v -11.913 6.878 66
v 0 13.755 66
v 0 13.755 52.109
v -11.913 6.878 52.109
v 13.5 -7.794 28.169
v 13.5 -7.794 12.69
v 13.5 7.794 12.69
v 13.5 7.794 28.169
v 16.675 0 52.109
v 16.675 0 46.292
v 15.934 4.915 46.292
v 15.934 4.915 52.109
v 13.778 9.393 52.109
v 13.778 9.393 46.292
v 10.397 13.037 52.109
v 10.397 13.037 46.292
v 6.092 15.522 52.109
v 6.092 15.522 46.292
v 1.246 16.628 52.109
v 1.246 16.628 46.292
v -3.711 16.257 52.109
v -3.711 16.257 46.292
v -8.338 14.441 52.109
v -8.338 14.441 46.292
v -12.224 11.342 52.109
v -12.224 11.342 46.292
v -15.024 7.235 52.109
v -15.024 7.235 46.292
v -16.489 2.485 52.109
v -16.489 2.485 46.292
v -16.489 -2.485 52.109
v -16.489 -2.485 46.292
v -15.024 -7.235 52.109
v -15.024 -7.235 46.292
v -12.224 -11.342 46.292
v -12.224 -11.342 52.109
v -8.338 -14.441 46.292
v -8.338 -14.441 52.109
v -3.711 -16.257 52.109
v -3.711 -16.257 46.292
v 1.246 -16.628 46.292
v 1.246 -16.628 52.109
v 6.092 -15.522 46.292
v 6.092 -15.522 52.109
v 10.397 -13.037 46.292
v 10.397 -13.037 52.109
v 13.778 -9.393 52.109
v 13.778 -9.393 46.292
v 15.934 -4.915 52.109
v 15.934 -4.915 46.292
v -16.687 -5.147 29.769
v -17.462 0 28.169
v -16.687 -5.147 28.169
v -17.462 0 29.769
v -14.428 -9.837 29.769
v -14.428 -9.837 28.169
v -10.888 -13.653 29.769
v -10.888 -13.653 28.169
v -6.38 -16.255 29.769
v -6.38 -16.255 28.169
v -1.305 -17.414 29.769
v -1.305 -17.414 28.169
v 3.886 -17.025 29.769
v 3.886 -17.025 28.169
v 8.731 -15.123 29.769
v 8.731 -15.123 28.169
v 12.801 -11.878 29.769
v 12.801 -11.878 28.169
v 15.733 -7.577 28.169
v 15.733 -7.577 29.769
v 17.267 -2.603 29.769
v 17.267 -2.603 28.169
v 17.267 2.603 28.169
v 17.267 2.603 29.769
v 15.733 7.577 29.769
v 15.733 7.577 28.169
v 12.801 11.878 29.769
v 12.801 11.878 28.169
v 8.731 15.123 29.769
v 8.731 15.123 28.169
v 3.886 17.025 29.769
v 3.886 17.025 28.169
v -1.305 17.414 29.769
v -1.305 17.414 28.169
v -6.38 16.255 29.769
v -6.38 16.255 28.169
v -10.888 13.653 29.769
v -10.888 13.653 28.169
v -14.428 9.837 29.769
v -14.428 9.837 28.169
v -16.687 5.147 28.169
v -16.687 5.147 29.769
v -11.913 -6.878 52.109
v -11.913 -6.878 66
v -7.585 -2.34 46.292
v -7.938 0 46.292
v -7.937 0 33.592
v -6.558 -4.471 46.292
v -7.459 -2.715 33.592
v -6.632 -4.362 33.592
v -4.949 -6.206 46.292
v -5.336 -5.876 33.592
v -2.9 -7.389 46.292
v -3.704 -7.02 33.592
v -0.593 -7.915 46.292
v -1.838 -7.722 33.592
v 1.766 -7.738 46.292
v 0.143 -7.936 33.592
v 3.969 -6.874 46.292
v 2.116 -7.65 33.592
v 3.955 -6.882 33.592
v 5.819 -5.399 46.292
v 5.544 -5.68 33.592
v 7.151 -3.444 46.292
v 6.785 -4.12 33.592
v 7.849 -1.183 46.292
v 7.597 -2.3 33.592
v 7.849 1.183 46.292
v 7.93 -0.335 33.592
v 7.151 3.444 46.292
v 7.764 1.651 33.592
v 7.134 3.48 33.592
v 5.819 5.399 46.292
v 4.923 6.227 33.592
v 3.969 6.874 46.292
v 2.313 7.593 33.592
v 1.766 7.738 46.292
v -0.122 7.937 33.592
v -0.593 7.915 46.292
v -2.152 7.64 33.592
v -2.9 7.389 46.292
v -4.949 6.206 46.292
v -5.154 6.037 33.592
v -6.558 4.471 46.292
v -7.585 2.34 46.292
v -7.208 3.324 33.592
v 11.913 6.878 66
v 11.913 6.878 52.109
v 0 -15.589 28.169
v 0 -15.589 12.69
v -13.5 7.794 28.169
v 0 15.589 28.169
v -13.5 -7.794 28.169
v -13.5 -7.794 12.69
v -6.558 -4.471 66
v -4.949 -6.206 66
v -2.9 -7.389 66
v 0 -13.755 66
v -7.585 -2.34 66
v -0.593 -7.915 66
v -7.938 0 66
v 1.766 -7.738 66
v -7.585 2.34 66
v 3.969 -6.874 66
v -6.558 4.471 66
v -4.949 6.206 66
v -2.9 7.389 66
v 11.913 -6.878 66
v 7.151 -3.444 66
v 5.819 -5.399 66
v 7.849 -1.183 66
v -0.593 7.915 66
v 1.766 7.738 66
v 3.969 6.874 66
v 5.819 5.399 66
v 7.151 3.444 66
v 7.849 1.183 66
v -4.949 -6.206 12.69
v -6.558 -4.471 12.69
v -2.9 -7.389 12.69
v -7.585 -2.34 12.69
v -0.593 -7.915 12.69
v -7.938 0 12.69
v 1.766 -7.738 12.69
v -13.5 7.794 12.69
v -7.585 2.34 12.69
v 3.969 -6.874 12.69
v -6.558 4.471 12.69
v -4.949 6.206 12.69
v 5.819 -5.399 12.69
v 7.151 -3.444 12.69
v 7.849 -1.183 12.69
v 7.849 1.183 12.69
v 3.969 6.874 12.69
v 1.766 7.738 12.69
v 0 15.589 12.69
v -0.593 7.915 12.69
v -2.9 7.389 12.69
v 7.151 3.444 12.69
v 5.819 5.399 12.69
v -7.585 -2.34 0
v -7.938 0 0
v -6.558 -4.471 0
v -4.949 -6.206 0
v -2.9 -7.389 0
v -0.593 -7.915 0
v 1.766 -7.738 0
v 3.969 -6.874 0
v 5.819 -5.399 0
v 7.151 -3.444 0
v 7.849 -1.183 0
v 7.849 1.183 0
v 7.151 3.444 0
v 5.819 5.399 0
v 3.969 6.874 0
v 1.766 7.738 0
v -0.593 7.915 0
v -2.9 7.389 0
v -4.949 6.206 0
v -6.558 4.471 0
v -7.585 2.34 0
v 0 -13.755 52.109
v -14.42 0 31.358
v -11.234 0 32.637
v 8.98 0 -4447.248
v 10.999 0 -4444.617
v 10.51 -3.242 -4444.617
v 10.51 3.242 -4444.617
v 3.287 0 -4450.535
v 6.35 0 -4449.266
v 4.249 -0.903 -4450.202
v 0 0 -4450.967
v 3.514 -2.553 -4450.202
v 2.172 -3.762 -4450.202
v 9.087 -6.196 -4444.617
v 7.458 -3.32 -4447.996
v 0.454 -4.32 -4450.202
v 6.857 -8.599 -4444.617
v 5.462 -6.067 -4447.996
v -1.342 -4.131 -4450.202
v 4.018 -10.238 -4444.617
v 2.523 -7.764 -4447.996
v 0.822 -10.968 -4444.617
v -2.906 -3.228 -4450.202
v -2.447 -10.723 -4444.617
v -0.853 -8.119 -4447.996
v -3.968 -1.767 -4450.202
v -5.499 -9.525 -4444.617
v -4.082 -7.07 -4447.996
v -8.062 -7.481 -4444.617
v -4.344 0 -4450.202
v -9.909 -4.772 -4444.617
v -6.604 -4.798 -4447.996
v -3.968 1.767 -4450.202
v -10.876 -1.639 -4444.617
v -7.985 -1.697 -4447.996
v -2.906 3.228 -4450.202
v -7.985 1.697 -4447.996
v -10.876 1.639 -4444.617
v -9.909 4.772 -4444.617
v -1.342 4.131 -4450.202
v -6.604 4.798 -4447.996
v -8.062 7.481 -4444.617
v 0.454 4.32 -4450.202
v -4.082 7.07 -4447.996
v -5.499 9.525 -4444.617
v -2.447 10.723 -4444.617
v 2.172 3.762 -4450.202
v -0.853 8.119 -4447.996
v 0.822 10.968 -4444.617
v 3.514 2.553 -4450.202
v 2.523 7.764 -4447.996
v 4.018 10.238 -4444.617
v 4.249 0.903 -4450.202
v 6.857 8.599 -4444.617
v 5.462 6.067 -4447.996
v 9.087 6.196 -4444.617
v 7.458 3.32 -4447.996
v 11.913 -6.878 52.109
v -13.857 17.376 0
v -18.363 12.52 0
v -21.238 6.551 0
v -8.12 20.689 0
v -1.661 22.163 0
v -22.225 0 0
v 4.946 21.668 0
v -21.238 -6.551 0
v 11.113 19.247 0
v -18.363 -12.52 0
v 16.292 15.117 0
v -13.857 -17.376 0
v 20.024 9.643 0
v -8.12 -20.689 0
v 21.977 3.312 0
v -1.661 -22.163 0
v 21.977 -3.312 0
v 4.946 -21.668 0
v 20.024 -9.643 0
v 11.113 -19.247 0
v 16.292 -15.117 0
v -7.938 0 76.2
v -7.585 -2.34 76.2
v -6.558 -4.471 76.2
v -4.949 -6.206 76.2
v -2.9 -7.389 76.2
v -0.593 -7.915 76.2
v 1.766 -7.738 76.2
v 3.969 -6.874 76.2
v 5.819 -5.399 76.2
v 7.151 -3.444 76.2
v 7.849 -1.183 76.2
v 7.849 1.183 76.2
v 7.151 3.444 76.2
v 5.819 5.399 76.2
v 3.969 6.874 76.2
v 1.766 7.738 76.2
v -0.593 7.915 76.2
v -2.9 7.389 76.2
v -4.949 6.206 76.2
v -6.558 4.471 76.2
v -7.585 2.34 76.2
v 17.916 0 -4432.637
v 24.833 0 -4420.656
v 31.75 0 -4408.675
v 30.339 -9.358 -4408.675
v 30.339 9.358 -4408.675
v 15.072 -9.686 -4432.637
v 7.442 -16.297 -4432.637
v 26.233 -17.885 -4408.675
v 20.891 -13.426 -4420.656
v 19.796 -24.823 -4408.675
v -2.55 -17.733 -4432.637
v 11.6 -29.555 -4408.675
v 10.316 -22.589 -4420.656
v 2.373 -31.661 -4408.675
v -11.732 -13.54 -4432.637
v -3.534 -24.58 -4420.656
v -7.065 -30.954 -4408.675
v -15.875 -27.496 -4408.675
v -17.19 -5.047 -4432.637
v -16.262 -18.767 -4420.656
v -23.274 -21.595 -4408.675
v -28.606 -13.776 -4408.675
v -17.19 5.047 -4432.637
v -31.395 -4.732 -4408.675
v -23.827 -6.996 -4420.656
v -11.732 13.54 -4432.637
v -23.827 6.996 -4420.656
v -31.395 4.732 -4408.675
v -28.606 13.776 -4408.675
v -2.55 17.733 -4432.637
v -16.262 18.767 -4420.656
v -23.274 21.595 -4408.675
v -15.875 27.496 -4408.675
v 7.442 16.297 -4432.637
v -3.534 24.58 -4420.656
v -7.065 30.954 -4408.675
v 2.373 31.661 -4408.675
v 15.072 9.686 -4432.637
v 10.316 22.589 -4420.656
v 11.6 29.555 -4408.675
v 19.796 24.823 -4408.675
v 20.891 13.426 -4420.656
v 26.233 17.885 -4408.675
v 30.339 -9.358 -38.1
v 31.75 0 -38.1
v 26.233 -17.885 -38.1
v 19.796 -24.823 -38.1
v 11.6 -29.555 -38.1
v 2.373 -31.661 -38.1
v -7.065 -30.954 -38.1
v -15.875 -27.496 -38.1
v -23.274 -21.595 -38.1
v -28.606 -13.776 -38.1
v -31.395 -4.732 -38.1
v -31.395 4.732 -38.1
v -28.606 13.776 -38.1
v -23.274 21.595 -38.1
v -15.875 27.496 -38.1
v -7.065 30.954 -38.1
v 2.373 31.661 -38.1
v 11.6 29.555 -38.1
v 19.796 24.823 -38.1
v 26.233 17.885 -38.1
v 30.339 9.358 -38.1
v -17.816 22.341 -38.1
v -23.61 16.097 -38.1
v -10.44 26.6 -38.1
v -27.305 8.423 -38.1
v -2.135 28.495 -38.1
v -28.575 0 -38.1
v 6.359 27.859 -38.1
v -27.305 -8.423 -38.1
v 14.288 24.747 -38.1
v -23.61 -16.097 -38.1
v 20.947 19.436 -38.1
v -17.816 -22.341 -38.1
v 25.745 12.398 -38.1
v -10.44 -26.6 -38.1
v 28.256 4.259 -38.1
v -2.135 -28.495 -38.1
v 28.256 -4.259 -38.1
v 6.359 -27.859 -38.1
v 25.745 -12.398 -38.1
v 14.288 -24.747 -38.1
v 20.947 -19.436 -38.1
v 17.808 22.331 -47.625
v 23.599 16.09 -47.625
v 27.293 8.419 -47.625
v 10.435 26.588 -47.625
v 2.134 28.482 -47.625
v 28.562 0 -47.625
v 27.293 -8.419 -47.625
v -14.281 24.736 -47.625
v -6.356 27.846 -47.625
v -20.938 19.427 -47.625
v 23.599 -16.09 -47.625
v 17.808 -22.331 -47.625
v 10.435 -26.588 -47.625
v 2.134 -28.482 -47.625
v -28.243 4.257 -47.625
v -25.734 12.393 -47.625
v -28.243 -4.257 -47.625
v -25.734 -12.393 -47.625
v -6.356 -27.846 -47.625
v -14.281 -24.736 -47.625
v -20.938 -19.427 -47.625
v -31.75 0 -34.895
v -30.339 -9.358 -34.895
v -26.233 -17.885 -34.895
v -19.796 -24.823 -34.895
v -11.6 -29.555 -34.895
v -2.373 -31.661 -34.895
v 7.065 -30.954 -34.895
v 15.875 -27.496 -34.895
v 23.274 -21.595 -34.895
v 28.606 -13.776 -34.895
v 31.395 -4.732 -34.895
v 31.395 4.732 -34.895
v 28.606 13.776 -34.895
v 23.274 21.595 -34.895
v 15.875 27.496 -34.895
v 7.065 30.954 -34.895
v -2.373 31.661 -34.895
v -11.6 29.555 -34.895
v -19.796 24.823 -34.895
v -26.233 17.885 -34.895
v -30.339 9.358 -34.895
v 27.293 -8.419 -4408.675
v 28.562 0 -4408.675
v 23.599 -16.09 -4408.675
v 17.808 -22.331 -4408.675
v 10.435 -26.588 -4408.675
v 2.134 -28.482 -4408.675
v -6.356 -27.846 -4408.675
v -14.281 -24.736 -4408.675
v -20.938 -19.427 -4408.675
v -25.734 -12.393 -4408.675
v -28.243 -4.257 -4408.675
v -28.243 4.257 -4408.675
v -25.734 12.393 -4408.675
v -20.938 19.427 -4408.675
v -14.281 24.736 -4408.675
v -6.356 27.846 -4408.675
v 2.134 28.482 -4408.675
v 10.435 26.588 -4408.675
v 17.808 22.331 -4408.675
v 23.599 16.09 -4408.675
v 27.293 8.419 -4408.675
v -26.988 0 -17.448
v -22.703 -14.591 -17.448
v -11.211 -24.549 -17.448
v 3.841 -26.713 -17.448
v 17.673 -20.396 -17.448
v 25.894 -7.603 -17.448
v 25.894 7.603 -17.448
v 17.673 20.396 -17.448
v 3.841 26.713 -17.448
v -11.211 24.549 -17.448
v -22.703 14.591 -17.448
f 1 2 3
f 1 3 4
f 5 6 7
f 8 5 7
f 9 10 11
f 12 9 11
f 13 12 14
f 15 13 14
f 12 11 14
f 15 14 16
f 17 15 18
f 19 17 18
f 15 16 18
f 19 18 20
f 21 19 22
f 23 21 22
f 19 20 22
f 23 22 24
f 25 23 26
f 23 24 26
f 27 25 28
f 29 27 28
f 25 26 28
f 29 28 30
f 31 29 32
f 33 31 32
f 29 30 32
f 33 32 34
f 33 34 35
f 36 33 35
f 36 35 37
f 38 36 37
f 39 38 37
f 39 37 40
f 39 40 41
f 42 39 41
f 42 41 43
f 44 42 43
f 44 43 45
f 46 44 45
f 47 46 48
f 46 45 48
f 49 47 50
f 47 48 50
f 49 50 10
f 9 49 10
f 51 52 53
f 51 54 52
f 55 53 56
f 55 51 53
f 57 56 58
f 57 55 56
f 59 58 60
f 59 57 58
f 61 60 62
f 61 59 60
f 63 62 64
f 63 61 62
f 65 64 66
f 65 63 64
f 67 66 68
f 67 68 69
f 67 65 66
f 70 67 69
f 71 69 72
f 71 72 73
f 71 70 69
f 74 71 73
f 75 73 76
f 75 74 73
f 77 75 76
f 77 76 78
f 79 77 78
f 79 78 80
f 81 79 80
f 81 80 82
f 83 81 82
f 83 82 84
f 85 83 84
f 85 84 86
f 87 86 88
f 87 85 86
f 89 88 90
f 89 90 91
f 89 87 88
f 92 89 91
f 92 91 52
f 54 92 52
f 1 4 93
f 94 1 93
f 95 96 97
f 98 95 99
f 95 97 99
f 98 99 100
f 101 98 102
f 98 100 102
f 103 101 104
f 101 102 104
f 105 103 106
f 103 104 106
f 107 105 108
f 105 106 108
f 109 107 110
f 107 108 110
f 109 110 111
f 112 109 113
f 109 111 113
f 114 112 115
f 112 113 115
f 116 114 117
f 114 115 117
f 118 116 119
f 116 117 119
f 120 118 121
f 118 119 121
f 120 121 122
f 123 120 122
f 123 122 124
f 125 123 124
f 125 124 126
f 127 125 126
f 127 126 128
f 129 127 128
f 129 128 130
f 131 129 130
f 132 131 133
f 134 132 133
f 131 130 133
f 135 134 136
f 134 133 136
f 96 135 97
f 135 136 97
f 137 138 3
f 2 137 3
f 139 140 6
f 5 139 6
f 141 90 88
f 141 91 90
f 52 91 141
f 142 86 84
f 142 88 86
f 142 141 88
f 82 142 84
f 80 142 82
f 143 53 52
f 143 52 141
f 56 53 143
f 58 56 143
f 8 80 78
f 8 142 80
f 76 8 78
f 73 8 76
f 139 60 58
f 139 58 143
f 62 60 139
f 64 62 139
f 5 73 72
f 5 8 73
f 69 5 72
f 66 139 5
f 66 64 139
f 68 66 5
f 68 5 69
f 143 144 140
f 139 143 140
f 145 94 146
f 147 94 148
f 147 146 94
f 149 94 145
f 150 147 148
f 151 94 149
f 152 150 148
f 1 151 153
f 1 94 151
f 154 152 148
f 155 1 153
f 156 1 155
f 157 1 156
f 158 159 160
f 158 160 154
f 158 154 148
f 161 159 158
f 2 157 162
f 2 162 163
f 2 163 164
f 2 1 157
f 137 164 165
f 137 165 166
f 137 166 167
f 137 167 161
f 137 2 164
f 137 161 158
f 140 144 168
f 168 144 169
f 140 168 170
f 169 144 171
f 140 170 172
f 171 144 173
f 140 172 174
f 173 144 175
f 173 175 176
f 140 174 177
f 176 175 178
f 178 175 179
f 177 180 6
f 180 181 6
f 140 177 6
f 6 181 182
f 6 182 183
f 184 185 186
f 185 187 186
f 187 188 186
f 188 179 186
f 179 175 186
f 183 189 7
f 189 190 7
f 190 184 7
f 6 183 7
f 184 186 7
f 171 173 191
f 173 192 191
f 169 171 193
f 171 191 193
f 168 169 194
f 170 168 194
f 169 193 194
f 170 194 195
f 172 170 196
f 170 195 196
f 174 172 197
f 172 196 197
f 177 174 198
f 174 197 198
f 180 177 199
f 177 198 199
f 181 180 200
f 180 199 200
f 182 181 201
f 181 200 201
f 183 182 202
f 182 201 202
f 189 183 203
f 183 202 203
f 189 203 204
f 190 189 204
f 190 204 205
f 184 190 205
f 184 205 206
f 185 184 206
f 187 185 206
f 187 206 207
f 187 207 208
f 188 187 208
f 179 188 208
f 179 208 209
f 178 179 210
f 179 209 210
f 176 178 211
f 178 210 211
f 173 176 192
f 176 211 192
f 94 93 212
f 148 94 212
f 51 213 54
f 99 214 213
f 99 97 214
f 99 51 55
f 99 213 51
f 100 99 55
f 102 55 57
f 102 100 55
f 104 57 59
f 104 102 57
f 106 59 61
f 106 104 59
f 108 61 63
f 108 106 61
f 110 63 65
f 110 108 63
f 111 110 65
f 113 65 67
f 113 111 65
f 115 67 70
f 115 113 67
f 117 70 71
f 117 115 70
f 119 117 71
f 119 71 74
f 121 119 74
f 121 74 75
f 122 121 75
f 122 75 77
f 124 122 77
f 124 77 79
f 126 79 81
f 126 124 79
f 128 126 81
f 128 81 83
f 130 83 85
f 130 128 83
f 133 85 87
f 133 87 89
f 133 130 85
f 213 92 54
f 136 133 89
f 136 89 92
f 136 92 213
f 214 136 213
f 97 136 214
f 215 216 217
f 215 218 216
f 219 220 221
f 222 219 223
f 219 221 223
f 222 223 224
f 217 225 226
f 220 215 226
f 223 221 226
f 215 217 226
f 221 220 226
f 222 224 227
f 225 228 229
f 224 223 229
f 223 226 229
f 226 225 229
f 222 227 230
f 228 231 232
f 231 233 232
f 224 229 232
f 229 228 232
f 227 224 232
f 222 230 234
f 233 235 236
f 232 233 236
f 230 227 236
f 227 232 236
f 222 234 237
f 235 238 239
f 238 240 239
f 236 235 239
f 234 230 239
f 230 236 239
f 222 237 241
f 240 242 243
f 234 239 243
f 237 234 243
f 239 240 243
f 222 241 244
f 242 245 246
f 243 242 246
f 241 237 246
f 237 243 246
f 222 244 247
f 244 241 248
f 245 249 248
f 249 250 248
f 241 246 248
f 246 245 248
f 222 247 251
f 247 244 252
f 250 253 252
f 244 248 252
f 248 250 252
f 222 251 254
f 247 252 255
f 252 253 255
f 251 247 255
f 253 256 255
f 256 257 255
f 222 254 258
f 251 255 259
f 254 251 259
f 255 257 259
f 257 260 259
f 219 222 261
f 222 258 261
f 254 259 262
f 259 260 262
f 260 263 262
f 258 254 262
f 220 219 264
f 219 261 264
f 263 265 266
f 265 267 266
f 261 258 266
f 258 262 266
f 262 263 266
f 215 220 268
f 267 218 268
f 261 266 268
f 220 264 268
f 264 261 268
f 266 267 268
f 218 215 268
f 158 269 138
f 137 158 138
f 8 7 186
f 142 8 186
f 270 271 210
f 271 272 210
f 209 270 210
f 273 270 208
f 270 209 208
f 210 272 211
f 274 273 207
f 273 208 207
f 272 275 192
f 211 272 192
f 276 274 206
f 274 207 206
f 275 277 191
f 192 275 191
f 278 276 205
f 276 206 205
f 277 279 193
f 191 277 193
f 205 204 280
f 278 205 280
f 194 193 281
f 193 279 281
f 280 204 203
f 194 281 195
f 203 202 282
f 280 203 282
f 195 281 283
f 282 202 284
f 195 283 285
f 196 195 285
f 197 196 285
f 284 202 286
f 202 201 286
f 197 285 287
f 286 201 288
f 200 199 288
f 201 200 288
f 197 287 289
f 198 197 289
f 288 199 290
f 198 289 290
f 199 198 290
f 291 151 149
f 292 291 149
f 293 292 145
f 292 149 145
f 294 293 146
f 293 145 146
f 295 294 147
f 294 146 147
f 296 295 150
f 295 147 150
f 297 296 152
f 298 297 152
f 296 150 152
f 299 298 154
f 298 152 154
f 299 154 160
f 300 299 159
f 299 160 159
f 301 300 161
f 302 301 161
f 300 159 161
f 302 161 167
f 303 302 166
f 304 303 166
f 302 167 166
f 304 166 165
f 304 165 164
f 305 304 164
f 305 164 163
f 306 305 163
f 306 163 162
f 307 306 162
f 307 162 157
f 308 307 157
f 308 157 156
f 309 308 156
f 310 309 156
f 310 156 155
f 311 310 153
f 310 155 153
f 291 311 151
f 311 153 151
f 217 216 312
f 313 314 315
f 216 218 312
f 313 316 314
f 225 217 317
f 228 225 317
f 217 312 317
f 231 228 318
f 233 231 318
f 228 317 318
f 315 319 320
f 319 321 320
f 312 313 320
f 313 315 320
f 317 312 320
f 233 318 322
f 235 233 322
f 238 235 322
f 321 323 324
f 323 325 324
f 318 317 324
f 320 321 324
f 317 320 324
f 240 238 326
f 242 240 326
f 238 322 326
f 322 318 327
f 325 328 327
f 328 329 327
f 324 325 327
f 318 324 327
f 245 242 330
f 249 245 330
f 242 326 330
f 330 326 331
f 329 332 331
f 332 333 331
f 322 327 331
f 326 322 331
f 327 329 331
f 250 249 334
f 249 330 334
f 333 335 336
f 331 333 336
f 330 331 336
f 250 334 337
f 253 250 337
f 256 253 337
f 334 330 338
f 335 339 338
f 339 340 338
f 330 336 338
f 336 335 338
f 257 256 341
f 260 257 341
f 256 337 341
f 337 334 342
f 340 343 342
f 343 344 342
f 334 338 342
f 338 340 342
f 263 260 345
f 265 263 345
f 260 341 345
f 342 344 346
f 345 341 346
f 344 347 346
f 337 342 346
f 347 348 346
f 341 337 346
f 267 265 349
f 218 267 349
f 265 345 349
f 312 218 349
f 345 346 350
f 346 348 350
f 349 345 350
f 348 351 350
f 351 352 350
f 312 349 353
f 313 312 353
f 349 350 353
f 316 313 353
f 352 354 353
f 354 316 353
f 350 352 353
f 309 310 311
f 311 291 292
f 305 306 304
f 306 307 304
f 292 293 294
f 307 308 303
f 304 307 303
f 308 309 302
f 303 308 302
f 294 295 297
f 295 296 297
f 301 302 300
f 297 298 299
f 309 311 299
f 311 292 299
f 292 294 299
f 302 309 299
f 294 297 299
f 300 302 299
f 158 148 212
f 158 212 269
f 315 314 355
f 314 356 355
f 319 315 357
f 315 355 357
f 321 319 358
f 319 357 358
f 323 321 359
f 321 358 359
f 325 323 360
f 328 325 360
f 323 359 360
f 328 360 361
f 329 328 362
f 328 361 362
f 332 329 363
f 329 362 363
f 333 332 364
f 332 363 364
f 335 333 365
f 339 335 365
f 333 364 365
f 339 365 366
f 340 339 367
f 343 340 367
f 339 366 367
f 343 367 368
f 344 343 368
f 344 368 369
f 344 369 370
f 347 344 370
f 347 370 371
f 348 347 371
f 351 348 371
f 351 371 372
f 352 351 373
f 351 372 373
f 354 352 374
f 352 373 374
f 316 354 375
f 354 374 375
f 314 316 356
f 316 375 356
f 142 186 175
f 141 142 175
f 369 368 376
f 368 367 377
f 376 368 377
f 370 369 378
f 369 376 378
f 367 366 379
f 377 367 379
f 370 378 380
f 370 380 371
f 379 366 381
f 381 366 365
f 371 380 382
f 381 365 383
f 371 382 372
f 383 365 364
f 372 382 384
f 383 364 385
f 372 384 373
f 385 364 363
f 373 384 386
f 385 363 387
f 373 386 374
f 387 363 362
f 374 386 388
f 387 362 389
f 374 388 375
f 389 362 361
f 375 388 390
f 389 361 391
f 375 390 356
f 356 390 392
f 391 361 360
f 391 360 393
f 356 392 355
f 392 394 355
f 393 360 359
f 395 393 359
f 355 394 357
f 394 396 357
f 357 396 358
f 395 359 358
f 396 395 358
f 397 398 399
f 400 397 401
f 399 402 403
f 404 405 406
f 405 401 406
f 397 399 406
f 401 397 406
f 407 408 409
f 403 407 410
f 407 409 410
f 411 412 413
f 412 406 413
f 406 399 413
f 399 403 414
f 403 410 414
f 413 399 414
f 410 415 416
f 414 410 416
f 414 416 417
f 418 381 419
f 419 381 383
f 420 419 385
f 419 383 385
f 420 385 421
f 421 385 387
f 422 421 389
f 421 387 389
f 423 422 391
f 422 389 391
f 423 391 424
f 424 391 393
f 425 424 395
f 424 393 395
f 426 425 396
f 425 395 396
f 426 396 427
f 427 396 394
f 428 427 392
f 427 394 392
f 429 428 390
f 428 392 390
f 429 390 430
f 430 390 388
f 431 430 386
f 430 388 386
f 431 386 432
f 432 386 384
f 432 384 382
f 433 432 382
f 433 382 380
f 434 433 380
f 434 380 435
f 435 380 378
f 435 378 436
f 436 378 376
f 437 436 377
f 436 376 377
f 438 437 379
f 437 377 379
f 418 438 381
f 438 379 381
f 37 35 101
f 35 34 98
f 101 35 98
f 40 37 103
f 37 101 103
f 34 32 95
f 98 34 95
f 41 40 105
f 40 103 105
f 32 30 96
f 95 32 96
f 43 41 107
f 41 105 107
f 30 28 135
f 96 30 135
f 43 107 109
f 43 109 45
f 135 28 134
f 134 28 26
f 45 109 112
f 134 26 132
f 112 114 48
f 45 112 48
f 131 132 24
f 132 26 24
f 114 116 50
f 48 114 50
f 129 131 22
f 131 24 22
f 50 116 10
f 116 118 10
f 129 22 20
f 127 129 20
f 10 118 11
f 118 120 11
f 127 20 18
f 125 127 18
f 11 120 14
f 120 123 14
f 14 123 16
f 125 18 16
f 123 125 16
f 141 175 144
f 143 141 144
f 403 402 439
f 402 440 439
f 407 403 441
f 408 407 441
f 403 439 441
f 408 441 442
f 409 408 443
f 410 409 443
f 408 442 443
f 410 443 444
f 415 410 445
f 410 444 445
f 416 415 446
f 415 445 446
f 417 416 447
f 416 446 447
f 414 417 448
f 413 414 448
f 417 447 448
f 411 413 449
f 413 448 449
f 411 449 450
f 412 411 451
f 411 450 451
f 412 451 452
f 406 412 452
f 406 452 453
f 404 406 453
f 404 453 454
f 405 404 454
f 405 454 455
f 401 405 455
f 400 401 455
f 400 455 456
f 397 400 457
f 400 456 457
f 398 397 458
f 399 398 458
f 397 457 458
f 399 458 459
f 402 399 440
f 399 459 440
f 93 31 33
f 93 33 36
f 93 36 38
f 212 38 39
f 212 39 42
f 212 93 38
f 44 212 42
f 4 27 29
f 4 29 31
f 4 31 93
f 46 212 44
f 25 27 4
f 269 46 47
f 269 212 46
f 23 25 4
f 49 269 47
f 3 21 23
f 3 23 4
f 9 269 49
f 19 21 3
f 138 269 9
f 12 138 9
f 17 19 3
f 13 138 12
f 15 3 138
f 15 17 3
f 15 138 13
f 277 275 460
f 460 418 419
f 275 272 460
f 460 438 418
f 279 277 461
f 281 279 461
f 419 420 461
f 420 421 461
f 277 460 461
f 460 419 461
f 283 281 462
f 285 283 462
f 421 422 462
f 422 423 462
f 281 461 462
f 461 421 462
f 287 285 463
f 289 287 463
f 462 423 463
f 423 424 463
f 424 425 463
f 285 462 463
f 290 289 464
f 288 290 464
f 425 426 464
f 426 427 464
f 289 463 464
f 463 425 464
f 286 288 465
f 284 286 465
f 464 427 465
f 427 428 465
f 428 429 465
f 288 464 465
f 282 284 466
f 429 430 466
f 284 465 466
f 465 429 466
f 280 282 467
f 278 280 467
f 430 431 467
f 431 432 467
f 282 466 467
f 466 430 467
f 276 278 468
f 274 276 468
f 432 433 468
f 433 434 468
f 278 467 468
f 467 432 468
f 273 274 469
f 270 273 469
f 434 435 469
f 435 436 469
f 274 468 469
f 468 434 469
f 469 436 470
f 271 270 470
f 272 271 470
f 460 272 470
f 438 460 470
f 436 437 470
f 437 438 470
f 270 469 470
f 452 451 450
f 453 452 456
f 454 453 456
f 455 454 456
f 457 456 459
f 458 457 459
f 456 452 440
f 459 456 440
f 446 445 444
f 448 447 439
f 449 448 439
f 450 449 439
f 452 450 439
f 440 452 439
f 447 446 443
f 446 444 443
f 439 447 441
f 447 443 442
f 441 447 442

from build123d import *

# Parameters (mm, degrees)
BOSS_REVOLVE3_START         = 12.690475
BOSS_REVOLVE3_OUTLINE_R     = 7.9375
BOSS_REVOLVE3_DEPTH         = 15.478125
BOSS_REVOLVE3_START_2       = 46.292398399
BOSS_REVOLVE3_2_OUTLINE_R   = 16.6751
BOSS_REVOLVE3_2_OUTLINE_R_2 = 7.9375
BOSS_REVOLVE3_2_DEPTH       = 5.8166
BOSS_EXTRUDE2_DEPTH         = 13.890625


# Read off the part's stored shape, not the designer's step: Boss-Revolve3
with BuildPart() as part:
    # Sketch1 → Base-Revolve (revolve)
    with BuildSketch(Plane(origin=(0, 0, 0), x_dir=(0, 0, -1), z_dir=(1, 0, 0)), mode=Mode.PRIVATE) as base_revolve_sk:
        Polygon((-76.2, 0), (-76.2, 7.9375), (0, 7.9375), (0, 22.225), (34.895210283, 31.75), (38.1, 28.575), (47.625, 28.575), (47.625, 0), align=None)
    revolve(base_revolve_sk.sketch.rotate(Axis((0, 0, 0), (0, 0, 1)), 90), axis=Axis((0, 0, 0), (0, 0, 1)))

    # Sketch3 → Boss-Revolve2 (revolve)
    with BuildSketch(Plane(origin=(0, 0, 0), x_dir=(0, 0, -1), z_dir=(1, 0, 0)), mode=Mode.PRIVATE) as boss_revolve2_sk:
        with BuildLine():
            Line((-28.1686, 0), (-28.1686, 17.4625))
            Line((-28.1686, 17.4625), (-29.7688, 17.4625))
            ThreePointArc((-29.7688, 17.4625), (-33.309963658, 9.048473715), (-34.5186, 0))
            Line((-34.5186, 0), (-28.1686, 0))
        make_face()
    revolve(boss_revolve2_sk.sketch.rotate(Axis((0, 0, 0), (0, 0, 1)), 90), axis=Axis((0, 0, 0), (0, 0, 1)))

    # Sketch2 → Boss-Revolve1 (revolve)
    with BuildSketch(Plane(origin=(0, 0, 0), x_dir=(0, 0, -1), z_dir=(1, 0, 0)), mode=Mode.PRIVATE) as boss_revolve1_sk:
        with BuildLine():
            Line((38.1, 31.75), (38.1, 28.5623))
            Line((38.1, 28.5623), (4408.674792498, 28.5623))
            Line((4408.674792498, 28.5623), (4408.674792498, 0))
            Line((4408.674792498, 0), (4450.967405638, 0))
            ThreePointArc((4450.967405638, 0), (4449.265928266, 6.35), (4444.617405638, 10.998522628))
            Line((4444.617405638, 10.998522628), (4408.674792498, 31.75))
            Line((4408.674792498, 31.75), (38.1, 31.75))
        make_face()
    revolve(boss_revolve1_sk.sketch.rotate(Axis((0, 0, 29.7434), (0, 0, -1)), 90), axis=Axis((0, 0, 29.7434), (0, 0, -1)))

    # Boss-Revolve3 outline → Boss-Revolve3 (add)
    with BuildSketch(Plane.XY.offset(BOSS_REVOLVE3_START)):
        Polygon((0, -15.588572738), (13.5001, -7.794286369), (13.5001, 7.794286369), (0, 15.588572738), (-13.5001, 7.794286369), (-13.5001, -7.794286369), align=None)
        Circle(BOSS_REVOLVE3_OUTLINE_R, mode=Mode.SUBTRACT)
    extrude(amount=BOSS_REVOLVE3_DEPTH)

    # Boss-Revolve3 2 outline → Boss-Revolve3 2 (add)
    with BuildSketch(Plane.XY.offset(BOSS_REVOLVE3_START_2)):
        Circle(BOSS_REVOLVE3_2_OUTLINE_R)
        Circle(BOSS_REVOLVE3_2_OUTLINE_R_2, mode=Mode.SUBTRACT)
    extrude(amount=BOSS_REVOLVE3_2_DEPTH)

    # Sketch6 → Boss-Extrude2 (add)
    with BuildSketch(Plane.XY.offset(52.108998399)):
        Polygon((0, -13.755485633), (11.9126, -6.877742817), (11.9126, 6.877742817), (0, 13.755485633), (-11.9126, 6.877742817), (-11.9126, -6.877742817), align=None)
    extrude(amount=BOSS_EXTRUDE2_DEPTH)


solid = part.part
